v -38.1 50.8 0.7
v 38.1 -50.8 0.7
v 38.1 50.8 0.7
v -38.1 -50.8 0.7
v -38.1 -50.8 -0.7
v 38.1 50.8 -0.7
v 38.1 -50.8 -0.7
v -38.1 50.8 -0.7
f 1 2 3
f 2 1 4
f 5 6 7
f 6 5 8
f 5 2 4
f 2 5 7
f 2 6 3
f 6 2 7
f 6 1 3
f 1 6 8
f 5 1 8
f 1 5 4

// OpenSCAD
//Plate for maintaining orthogonality when measuring material sheets
length = 76.2;
width = 101.6;
height = 1.4;
cube([length,width,height], true);
